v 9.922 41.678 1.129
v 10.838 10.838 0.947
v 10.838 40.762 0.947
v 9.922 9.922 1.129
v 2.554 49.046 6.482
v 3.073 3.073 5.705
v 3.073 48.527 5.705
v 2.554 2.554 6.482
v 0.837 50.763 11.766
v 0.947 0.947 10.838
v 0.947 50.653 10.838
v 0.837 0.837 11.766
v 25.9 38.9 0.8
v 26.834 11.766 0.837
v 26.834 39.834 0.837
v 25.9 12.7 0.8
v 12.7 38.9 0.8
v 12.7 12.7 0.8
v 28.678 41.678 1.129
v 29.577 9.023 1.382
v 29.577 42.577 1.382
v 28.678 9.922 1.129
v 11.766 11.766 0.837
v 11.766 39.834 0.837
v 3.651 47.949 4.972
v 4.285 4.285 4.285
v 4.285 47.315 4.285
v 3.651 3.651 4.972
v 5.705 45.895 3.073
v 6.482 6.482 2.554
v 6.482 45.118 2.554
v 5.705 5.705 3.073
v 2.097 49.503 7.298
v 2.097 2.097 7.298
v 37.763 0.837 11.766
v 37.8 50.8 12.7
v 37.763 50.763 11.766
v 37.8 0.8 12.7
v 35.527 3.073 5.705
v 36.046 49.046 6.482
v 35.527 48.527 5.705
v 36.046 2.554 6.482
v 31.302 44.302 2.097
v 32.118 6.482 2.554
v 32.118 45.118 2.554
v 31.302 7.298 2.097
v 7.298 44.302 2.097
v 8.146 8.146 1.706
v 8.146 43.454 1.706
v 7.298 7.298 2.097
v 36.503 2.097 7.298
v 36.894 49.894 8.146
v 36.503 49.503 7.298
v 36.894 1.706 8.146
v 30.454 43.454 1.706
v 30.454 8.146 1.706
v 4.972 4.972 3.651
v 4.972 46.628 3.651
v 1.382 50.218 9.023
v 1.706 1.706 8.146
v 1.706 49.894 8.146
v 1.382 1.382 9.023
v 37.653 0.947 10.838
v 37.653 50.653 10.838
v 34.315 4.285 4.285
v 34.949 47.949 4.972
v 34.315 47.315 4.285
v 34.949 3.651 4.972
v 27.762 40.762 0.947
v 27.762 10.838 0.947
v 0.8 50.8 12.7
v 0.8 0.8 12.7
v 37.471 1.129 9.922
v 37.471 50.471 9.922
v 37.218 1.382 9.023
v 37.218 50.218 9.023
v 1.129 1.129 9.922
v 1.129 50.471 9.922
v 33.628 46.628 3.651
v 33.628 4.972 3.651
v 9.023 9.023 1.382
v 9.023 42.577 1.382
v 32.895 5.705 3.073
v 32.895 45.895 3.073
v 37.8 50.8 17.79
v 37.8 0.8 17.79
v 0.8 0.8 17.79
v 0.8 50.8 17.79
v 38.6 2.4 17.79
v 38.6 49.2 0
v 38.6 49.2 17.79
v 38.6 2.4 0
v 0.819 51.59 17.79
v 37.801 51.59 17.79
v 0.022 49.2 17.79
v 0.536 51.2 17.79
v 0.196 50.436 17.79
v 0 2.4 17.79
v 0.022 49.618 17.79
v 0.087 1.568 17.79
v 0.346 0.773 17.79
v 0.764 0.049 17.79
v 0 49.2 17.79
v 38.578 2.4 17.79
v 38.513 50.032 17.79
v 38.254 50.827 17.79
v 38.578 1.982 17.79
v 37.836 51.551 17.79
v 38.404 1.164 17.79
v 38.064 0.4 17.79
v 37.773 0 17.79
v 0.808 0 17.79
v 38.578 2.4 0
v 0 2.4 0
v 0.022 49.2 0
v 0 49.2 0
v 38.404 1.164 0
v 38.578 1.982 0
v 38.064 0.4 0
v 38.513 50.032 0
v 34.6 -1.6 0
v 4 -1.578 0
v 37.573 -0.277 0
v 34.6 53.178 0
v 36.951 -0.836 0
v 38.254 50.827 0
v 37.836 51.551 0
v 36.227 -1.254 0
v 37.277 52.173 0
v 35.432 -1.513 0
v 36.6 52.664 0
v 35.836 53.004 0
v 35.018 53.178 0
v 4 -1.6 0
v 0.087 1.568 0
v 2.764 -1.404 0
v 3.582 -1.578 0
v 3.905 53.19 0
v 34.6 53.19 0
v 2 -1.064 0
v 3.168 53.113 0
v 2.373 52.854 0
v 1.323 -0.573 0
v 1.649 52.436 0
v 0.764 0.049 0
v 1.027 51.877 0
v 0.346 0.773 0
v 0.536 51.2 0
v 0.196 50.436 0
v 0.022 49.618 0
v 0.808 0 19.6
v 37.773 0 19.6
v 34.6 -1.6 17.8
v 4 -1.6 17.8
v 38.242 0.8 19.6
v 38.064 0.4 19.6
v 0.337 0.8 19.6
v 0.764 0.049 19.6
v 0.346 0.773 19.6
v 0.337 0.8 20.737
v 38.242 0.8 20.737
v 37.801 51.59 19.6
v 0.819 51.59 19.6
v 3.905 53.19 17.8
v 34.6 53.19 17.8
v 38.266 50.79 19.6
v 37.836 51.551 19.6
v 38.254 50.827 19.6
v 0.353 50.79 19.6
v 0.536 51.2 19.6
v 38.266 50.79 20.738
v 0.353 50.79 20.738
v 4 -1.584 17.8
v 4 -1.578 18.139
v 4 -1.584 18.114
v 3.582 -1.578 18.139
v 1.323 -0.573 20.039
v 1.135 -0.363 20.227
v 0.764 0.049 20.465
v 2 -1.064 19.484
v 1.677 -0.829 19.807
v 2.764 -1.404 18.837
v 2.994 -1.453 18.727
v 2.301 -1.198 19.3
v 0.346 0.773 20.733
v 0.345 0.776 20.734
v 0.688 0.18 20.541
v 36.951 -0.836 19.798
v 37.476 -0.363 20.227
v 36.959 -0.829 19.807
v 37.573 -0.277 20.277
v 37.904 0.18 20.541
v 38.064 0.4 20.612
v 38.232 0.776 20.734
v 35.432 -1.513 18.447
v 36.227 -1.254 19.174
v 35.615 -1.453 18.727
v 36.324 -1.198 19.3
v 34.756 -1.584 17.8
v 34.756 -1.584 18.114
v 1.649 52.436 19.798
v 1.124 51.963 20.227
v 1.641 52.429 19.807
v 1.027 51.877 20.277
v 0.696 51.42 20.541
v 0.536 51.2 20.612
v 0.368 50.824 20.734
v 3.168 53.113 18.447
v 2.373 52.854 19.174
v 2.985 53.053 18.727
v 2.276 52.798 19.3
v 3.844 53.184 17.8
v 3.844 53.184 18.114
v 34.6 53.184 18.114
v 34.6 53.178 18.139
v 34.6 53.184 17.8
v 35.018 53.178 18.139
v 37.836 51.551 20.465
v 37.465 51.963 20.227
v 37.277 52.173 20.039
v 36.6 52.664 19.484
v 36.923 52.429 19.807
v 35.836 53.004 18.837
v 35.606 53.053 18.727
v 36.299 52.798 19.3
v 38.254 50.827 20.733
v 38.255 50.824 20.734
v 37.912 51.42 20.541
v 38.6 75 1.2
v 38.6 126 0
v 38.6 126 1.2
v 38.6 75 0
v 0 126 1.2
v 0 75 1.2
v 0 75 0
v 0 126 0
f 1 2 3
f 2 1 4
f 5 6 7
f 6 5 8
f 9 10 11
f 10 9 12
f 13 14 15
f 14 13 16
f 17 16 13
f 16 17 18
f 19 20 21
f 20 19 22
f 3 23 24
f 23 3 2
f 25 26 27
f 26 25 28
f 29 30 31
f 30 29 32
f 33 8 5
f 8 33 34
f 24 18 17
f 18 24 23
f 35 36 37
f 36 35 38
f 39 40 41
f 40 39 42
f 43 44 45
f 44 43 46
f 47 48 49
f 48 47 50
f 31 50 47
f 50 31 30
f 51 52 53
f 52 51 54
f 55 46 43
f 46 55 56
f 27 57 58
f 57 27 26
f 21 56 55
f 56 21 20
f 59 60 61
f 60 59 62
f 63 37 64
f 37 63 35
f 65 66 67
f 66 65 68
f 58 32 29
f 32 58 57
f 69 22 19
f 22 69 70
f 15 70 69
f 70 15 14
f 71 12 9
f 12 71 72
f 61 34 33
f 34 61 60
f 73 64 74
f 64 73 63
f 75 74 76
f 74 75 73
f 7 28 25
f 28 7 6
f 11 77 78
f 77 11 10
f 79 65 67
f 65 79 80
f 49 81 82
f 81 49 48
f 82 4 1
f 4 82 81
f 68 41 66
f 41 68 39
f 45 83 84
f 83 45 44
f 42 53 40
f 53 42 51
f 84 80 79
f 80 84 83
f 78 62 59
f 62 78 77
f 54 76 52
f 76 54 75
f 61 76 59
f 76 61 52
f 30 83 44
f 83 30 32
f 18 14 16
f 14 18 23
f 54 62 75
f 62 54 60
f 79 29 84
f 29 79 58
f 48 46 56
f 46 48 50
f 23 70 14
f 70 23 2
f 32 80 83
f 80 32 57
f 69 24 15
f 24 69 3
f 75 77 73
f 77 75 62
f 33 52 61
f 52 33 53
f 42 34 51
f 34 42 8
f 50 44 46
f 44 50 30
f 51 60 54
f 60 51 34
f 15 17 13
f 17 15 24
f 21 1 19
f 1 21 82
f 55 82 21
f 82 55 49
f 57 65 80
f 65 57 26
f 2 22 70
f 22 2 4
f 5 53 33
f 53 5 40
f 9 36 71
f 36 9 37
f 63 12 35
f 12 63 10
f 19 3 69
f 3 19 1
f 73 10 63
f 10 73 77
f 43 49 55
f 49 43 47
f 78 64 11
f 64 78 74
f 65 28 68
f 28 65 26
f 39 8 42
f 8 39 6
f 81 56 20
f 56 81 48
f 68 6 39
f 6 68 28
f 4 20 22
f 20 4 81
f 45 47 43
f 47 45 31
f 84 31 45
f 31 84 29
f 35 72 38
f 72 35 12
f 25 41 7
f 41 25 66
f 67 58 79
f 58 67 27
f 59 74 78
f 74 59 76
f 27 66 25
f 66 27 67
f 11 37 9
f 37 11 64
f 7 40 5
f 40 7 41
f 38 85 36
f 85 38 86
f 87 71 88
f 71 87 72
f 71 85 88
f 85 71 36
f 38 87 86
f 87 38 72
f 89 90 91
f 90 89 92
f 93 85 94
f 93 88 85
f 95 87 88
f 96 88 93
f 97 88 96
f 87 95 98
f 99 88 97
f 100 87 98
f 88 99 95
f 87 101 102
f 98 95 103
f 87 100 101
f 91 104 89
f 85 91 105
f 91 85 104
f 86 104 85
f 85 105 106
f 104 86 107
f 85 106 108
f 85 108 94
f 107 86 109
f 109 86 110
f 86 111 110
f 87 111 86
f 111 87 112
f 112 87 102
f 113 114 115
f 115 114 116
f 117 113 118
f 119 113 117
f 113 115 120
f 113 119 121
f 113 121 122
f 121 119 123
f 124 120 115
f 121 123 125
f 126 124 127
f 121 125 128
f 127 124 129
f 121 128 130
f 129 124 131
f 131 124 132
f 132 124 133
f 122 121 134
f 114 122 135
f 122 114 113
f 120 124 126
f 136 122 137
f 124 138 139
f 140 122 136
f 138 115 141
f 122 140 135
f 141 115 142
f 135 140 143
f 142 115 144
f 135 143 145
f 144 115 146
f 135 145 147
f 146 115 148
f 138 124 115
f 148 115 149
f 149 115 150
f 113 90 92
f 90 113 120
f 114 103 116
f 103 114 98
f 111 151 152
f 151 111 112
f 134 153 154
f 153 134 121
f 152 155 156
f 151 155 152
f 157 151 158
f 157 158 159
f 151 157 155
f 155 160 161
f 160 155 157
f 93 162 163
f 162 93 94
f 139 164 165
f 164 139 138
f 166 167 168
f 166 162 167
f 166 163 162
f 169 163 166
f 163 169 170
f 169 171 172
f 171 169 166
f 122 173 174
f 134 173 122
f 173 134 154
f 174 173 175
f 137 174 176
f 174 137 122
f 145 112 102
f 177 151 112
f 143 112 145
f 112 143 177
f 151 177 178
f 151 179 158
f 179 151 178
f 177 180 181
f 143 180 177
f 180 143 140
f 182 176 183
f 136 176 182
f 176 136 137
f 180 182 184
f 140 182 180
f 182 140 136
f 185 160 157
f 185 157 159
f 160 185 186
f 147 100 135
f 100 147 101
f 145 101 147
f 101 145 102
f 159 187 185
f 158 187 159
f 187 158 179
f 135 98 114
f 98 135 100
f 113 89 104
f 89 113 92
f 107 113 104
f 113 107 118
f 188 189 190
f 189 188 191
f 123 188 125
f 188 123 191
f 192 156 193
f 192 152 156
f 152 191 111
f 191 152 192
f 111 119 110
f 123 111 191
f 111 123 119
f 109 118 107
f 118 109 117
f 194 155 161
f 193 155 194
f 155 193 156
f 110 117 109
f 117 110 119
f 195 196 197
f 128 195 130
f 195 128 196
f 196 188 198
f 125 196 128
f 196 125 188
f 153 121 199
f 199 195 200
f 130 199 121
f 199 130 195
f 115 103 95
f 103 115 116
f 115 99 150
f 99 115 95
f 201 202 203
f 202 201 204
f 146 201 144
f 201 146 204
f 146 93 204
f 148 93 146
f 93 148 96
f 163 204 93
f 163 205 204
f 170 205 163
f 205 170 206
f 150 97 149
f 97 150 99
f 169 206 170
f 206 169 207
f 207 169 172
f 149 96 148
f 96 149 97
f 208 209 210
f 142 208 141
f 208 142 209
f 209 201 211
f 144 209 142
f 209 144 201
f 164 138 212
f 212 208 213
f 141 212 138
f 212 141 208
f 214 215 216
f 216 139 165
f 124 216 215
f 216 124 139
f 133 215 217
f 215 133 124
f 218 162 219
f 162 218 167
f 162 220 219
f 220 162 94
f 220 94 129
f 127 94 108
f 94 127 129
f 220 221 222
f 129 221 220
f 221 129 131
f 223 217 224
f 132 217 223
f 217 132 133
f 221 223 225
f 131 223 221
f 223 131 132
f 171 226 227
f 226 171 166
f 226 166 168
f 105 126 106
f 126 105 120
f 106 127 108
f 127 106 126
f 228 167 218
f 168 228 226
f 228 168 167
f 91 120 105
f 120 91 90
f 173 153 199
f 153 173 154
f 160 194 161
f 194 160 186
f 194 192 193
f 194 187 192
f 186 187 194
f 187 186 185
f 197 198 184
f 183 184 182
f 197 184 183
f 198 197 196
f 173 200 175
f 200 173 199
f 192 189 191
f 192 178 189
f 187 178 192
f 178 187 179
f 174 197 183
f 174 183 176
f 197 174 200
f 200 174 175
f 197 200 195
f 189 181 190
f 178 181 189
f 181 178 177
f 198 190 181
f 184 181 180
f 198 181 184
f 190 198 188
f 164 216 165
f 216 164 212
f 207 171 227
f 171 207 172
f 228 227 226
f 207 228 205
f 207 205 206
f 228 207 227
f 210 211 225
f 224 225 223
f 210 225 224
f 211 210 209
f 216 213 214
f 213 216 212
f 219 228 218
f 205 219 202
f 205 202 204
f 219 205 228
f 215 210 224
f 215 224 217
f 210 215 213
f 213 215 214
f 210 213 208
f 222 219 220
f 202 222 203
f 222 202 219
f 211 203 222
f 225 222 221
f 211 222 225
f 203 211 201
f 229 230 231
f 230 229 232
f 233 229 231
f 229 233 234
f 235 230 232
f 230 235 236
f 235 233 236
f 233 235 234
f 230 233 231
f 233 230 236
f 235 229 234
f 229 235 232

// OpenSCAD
layerHeight    = 0.20;
layerThickness = 0.40;



wallThickness  = 2 * layerThickness;
baseThickness  = 4 * layerHeight;


numberOfTray   =  1  ;
trayLength     = 37.0;
trayWidith     = 50.0;
trayHeight     = 17.0;
trayRounding   =  0.7;

coverThickness   =  1.5;
sideThickness    =  4 * layerThickness;
overlapThickness =  6 * layerHeight;
play             =  0.3;
chamferRadius    =  4.0;

Len    = numberOfTray * (trayLength+wallThickness) + wallThickness;
Height = trayHeight+baseThickness+coverThickness+play + overlapThickness;
Widith = trayWidith + 2*wallThickness + 2*sideThickness; 

echo("Lid dimensions");
echo(Len);
echo(trayWidith + 2*wallThickness-2*play);

translate([0,1.5*trayWidith,0])
cube([Len, trayWidith + 2*wallThickness-2*play, 3*layerThickness]);

module RoundedSquare(length, widith, height, ratio) {
	radius = height*ratio;
	difference() {
		union() {
			intersection() {
				hull() {
					translate([radius,        0, radius]) rotate([-90,  0, 0]) cylinder(r=radius, h=widith, $fn=80); 
					translate([length-radius, 0, radius]) rotate([-90,  0, 0]) cylinder(r=radius, h=widith, $fn=80); 
				}
				hull() {
					translate([0,        radius, radius]) rotate([  0, 90, 0]) cylinder(r=radius, h=length, $fn=80); 
					translate([0, widith-radius, radius]) rotate([  0, 90, 0]) cylinder(r=radius, h=length, $fn=80); 
				}
			}
			translate([0, 0, radius]) cube([length, widith, height-radius+1]);
		}
		translate([-1, -1, height]) cube([length+2, widith+2, height*2]);
	}
}


module pillModule() {
	difference() {
		cube([trayLength+2*wallThickness, trayWidith+2*wallThickness, trayHeight+baseThickness-0.01]);
		translate([wallThickness, wallThickness, baseThickness]) RoundedSquare(trayLength, trayWidith, trayHeight, trayRounding);
	}
}

module chamferVert(cr, cl) {
	translate([0,0,-1]) difference() {
		translate([-cr, -cr,  0]) cube([cr*2, cr*2, cl+2]);
		translate([ cr,  cr,  -1]) cylinder(r=cr, h=cl+4, $fn=30);
	}
}


module side() {
	union() {
		translate([0, -sideThickness,      0]) cube([Len, sideThickness, 	            Height]);
		translate([0, -sideThickness, Height-overlapThickness]) cube([Len, sideThickness+wallThickness, overlapThickness]);
	}
}

difference() {
	union() {
		for(i = [0:numberOfTray-1]) {
			translate([i*(trayLength+wallThickness+0.02), 0, 0]) pillModule();
		}
		side();
		translate([Len, Widith-2*sideThickness-0.01]) rotate([0, 0, 180]) side();
	}
	translate([  0,       -sideThickness, 0]) rotate([  0, 0,  0]) chamferVert(chamferRadius, Height);
	translate([Len,       -sideThickness, 0]) rotate([  0, 0, 90]) chamferVert(chamferRadius, Height);
	translate([  0, Widith-sideThickness, 0]) rotate([  0, 0,-90]) chamferVert(chamferRadius, Height);
	translate([Len, Widith-sideThickness, 0]) rotate([  0, 0,180]) chamferVert(chamferRadius, Height);

	translate([  0,        -sideThickness, Height]) rotate([  0, 90,  0]) chamferVert(chamferRadius*0.75, Len);
	translate([ Len, Widith-sideThickness, Height]) rotate([180, 90,  0]) chamferVert(chamferRadius*0.75, Len);
}
